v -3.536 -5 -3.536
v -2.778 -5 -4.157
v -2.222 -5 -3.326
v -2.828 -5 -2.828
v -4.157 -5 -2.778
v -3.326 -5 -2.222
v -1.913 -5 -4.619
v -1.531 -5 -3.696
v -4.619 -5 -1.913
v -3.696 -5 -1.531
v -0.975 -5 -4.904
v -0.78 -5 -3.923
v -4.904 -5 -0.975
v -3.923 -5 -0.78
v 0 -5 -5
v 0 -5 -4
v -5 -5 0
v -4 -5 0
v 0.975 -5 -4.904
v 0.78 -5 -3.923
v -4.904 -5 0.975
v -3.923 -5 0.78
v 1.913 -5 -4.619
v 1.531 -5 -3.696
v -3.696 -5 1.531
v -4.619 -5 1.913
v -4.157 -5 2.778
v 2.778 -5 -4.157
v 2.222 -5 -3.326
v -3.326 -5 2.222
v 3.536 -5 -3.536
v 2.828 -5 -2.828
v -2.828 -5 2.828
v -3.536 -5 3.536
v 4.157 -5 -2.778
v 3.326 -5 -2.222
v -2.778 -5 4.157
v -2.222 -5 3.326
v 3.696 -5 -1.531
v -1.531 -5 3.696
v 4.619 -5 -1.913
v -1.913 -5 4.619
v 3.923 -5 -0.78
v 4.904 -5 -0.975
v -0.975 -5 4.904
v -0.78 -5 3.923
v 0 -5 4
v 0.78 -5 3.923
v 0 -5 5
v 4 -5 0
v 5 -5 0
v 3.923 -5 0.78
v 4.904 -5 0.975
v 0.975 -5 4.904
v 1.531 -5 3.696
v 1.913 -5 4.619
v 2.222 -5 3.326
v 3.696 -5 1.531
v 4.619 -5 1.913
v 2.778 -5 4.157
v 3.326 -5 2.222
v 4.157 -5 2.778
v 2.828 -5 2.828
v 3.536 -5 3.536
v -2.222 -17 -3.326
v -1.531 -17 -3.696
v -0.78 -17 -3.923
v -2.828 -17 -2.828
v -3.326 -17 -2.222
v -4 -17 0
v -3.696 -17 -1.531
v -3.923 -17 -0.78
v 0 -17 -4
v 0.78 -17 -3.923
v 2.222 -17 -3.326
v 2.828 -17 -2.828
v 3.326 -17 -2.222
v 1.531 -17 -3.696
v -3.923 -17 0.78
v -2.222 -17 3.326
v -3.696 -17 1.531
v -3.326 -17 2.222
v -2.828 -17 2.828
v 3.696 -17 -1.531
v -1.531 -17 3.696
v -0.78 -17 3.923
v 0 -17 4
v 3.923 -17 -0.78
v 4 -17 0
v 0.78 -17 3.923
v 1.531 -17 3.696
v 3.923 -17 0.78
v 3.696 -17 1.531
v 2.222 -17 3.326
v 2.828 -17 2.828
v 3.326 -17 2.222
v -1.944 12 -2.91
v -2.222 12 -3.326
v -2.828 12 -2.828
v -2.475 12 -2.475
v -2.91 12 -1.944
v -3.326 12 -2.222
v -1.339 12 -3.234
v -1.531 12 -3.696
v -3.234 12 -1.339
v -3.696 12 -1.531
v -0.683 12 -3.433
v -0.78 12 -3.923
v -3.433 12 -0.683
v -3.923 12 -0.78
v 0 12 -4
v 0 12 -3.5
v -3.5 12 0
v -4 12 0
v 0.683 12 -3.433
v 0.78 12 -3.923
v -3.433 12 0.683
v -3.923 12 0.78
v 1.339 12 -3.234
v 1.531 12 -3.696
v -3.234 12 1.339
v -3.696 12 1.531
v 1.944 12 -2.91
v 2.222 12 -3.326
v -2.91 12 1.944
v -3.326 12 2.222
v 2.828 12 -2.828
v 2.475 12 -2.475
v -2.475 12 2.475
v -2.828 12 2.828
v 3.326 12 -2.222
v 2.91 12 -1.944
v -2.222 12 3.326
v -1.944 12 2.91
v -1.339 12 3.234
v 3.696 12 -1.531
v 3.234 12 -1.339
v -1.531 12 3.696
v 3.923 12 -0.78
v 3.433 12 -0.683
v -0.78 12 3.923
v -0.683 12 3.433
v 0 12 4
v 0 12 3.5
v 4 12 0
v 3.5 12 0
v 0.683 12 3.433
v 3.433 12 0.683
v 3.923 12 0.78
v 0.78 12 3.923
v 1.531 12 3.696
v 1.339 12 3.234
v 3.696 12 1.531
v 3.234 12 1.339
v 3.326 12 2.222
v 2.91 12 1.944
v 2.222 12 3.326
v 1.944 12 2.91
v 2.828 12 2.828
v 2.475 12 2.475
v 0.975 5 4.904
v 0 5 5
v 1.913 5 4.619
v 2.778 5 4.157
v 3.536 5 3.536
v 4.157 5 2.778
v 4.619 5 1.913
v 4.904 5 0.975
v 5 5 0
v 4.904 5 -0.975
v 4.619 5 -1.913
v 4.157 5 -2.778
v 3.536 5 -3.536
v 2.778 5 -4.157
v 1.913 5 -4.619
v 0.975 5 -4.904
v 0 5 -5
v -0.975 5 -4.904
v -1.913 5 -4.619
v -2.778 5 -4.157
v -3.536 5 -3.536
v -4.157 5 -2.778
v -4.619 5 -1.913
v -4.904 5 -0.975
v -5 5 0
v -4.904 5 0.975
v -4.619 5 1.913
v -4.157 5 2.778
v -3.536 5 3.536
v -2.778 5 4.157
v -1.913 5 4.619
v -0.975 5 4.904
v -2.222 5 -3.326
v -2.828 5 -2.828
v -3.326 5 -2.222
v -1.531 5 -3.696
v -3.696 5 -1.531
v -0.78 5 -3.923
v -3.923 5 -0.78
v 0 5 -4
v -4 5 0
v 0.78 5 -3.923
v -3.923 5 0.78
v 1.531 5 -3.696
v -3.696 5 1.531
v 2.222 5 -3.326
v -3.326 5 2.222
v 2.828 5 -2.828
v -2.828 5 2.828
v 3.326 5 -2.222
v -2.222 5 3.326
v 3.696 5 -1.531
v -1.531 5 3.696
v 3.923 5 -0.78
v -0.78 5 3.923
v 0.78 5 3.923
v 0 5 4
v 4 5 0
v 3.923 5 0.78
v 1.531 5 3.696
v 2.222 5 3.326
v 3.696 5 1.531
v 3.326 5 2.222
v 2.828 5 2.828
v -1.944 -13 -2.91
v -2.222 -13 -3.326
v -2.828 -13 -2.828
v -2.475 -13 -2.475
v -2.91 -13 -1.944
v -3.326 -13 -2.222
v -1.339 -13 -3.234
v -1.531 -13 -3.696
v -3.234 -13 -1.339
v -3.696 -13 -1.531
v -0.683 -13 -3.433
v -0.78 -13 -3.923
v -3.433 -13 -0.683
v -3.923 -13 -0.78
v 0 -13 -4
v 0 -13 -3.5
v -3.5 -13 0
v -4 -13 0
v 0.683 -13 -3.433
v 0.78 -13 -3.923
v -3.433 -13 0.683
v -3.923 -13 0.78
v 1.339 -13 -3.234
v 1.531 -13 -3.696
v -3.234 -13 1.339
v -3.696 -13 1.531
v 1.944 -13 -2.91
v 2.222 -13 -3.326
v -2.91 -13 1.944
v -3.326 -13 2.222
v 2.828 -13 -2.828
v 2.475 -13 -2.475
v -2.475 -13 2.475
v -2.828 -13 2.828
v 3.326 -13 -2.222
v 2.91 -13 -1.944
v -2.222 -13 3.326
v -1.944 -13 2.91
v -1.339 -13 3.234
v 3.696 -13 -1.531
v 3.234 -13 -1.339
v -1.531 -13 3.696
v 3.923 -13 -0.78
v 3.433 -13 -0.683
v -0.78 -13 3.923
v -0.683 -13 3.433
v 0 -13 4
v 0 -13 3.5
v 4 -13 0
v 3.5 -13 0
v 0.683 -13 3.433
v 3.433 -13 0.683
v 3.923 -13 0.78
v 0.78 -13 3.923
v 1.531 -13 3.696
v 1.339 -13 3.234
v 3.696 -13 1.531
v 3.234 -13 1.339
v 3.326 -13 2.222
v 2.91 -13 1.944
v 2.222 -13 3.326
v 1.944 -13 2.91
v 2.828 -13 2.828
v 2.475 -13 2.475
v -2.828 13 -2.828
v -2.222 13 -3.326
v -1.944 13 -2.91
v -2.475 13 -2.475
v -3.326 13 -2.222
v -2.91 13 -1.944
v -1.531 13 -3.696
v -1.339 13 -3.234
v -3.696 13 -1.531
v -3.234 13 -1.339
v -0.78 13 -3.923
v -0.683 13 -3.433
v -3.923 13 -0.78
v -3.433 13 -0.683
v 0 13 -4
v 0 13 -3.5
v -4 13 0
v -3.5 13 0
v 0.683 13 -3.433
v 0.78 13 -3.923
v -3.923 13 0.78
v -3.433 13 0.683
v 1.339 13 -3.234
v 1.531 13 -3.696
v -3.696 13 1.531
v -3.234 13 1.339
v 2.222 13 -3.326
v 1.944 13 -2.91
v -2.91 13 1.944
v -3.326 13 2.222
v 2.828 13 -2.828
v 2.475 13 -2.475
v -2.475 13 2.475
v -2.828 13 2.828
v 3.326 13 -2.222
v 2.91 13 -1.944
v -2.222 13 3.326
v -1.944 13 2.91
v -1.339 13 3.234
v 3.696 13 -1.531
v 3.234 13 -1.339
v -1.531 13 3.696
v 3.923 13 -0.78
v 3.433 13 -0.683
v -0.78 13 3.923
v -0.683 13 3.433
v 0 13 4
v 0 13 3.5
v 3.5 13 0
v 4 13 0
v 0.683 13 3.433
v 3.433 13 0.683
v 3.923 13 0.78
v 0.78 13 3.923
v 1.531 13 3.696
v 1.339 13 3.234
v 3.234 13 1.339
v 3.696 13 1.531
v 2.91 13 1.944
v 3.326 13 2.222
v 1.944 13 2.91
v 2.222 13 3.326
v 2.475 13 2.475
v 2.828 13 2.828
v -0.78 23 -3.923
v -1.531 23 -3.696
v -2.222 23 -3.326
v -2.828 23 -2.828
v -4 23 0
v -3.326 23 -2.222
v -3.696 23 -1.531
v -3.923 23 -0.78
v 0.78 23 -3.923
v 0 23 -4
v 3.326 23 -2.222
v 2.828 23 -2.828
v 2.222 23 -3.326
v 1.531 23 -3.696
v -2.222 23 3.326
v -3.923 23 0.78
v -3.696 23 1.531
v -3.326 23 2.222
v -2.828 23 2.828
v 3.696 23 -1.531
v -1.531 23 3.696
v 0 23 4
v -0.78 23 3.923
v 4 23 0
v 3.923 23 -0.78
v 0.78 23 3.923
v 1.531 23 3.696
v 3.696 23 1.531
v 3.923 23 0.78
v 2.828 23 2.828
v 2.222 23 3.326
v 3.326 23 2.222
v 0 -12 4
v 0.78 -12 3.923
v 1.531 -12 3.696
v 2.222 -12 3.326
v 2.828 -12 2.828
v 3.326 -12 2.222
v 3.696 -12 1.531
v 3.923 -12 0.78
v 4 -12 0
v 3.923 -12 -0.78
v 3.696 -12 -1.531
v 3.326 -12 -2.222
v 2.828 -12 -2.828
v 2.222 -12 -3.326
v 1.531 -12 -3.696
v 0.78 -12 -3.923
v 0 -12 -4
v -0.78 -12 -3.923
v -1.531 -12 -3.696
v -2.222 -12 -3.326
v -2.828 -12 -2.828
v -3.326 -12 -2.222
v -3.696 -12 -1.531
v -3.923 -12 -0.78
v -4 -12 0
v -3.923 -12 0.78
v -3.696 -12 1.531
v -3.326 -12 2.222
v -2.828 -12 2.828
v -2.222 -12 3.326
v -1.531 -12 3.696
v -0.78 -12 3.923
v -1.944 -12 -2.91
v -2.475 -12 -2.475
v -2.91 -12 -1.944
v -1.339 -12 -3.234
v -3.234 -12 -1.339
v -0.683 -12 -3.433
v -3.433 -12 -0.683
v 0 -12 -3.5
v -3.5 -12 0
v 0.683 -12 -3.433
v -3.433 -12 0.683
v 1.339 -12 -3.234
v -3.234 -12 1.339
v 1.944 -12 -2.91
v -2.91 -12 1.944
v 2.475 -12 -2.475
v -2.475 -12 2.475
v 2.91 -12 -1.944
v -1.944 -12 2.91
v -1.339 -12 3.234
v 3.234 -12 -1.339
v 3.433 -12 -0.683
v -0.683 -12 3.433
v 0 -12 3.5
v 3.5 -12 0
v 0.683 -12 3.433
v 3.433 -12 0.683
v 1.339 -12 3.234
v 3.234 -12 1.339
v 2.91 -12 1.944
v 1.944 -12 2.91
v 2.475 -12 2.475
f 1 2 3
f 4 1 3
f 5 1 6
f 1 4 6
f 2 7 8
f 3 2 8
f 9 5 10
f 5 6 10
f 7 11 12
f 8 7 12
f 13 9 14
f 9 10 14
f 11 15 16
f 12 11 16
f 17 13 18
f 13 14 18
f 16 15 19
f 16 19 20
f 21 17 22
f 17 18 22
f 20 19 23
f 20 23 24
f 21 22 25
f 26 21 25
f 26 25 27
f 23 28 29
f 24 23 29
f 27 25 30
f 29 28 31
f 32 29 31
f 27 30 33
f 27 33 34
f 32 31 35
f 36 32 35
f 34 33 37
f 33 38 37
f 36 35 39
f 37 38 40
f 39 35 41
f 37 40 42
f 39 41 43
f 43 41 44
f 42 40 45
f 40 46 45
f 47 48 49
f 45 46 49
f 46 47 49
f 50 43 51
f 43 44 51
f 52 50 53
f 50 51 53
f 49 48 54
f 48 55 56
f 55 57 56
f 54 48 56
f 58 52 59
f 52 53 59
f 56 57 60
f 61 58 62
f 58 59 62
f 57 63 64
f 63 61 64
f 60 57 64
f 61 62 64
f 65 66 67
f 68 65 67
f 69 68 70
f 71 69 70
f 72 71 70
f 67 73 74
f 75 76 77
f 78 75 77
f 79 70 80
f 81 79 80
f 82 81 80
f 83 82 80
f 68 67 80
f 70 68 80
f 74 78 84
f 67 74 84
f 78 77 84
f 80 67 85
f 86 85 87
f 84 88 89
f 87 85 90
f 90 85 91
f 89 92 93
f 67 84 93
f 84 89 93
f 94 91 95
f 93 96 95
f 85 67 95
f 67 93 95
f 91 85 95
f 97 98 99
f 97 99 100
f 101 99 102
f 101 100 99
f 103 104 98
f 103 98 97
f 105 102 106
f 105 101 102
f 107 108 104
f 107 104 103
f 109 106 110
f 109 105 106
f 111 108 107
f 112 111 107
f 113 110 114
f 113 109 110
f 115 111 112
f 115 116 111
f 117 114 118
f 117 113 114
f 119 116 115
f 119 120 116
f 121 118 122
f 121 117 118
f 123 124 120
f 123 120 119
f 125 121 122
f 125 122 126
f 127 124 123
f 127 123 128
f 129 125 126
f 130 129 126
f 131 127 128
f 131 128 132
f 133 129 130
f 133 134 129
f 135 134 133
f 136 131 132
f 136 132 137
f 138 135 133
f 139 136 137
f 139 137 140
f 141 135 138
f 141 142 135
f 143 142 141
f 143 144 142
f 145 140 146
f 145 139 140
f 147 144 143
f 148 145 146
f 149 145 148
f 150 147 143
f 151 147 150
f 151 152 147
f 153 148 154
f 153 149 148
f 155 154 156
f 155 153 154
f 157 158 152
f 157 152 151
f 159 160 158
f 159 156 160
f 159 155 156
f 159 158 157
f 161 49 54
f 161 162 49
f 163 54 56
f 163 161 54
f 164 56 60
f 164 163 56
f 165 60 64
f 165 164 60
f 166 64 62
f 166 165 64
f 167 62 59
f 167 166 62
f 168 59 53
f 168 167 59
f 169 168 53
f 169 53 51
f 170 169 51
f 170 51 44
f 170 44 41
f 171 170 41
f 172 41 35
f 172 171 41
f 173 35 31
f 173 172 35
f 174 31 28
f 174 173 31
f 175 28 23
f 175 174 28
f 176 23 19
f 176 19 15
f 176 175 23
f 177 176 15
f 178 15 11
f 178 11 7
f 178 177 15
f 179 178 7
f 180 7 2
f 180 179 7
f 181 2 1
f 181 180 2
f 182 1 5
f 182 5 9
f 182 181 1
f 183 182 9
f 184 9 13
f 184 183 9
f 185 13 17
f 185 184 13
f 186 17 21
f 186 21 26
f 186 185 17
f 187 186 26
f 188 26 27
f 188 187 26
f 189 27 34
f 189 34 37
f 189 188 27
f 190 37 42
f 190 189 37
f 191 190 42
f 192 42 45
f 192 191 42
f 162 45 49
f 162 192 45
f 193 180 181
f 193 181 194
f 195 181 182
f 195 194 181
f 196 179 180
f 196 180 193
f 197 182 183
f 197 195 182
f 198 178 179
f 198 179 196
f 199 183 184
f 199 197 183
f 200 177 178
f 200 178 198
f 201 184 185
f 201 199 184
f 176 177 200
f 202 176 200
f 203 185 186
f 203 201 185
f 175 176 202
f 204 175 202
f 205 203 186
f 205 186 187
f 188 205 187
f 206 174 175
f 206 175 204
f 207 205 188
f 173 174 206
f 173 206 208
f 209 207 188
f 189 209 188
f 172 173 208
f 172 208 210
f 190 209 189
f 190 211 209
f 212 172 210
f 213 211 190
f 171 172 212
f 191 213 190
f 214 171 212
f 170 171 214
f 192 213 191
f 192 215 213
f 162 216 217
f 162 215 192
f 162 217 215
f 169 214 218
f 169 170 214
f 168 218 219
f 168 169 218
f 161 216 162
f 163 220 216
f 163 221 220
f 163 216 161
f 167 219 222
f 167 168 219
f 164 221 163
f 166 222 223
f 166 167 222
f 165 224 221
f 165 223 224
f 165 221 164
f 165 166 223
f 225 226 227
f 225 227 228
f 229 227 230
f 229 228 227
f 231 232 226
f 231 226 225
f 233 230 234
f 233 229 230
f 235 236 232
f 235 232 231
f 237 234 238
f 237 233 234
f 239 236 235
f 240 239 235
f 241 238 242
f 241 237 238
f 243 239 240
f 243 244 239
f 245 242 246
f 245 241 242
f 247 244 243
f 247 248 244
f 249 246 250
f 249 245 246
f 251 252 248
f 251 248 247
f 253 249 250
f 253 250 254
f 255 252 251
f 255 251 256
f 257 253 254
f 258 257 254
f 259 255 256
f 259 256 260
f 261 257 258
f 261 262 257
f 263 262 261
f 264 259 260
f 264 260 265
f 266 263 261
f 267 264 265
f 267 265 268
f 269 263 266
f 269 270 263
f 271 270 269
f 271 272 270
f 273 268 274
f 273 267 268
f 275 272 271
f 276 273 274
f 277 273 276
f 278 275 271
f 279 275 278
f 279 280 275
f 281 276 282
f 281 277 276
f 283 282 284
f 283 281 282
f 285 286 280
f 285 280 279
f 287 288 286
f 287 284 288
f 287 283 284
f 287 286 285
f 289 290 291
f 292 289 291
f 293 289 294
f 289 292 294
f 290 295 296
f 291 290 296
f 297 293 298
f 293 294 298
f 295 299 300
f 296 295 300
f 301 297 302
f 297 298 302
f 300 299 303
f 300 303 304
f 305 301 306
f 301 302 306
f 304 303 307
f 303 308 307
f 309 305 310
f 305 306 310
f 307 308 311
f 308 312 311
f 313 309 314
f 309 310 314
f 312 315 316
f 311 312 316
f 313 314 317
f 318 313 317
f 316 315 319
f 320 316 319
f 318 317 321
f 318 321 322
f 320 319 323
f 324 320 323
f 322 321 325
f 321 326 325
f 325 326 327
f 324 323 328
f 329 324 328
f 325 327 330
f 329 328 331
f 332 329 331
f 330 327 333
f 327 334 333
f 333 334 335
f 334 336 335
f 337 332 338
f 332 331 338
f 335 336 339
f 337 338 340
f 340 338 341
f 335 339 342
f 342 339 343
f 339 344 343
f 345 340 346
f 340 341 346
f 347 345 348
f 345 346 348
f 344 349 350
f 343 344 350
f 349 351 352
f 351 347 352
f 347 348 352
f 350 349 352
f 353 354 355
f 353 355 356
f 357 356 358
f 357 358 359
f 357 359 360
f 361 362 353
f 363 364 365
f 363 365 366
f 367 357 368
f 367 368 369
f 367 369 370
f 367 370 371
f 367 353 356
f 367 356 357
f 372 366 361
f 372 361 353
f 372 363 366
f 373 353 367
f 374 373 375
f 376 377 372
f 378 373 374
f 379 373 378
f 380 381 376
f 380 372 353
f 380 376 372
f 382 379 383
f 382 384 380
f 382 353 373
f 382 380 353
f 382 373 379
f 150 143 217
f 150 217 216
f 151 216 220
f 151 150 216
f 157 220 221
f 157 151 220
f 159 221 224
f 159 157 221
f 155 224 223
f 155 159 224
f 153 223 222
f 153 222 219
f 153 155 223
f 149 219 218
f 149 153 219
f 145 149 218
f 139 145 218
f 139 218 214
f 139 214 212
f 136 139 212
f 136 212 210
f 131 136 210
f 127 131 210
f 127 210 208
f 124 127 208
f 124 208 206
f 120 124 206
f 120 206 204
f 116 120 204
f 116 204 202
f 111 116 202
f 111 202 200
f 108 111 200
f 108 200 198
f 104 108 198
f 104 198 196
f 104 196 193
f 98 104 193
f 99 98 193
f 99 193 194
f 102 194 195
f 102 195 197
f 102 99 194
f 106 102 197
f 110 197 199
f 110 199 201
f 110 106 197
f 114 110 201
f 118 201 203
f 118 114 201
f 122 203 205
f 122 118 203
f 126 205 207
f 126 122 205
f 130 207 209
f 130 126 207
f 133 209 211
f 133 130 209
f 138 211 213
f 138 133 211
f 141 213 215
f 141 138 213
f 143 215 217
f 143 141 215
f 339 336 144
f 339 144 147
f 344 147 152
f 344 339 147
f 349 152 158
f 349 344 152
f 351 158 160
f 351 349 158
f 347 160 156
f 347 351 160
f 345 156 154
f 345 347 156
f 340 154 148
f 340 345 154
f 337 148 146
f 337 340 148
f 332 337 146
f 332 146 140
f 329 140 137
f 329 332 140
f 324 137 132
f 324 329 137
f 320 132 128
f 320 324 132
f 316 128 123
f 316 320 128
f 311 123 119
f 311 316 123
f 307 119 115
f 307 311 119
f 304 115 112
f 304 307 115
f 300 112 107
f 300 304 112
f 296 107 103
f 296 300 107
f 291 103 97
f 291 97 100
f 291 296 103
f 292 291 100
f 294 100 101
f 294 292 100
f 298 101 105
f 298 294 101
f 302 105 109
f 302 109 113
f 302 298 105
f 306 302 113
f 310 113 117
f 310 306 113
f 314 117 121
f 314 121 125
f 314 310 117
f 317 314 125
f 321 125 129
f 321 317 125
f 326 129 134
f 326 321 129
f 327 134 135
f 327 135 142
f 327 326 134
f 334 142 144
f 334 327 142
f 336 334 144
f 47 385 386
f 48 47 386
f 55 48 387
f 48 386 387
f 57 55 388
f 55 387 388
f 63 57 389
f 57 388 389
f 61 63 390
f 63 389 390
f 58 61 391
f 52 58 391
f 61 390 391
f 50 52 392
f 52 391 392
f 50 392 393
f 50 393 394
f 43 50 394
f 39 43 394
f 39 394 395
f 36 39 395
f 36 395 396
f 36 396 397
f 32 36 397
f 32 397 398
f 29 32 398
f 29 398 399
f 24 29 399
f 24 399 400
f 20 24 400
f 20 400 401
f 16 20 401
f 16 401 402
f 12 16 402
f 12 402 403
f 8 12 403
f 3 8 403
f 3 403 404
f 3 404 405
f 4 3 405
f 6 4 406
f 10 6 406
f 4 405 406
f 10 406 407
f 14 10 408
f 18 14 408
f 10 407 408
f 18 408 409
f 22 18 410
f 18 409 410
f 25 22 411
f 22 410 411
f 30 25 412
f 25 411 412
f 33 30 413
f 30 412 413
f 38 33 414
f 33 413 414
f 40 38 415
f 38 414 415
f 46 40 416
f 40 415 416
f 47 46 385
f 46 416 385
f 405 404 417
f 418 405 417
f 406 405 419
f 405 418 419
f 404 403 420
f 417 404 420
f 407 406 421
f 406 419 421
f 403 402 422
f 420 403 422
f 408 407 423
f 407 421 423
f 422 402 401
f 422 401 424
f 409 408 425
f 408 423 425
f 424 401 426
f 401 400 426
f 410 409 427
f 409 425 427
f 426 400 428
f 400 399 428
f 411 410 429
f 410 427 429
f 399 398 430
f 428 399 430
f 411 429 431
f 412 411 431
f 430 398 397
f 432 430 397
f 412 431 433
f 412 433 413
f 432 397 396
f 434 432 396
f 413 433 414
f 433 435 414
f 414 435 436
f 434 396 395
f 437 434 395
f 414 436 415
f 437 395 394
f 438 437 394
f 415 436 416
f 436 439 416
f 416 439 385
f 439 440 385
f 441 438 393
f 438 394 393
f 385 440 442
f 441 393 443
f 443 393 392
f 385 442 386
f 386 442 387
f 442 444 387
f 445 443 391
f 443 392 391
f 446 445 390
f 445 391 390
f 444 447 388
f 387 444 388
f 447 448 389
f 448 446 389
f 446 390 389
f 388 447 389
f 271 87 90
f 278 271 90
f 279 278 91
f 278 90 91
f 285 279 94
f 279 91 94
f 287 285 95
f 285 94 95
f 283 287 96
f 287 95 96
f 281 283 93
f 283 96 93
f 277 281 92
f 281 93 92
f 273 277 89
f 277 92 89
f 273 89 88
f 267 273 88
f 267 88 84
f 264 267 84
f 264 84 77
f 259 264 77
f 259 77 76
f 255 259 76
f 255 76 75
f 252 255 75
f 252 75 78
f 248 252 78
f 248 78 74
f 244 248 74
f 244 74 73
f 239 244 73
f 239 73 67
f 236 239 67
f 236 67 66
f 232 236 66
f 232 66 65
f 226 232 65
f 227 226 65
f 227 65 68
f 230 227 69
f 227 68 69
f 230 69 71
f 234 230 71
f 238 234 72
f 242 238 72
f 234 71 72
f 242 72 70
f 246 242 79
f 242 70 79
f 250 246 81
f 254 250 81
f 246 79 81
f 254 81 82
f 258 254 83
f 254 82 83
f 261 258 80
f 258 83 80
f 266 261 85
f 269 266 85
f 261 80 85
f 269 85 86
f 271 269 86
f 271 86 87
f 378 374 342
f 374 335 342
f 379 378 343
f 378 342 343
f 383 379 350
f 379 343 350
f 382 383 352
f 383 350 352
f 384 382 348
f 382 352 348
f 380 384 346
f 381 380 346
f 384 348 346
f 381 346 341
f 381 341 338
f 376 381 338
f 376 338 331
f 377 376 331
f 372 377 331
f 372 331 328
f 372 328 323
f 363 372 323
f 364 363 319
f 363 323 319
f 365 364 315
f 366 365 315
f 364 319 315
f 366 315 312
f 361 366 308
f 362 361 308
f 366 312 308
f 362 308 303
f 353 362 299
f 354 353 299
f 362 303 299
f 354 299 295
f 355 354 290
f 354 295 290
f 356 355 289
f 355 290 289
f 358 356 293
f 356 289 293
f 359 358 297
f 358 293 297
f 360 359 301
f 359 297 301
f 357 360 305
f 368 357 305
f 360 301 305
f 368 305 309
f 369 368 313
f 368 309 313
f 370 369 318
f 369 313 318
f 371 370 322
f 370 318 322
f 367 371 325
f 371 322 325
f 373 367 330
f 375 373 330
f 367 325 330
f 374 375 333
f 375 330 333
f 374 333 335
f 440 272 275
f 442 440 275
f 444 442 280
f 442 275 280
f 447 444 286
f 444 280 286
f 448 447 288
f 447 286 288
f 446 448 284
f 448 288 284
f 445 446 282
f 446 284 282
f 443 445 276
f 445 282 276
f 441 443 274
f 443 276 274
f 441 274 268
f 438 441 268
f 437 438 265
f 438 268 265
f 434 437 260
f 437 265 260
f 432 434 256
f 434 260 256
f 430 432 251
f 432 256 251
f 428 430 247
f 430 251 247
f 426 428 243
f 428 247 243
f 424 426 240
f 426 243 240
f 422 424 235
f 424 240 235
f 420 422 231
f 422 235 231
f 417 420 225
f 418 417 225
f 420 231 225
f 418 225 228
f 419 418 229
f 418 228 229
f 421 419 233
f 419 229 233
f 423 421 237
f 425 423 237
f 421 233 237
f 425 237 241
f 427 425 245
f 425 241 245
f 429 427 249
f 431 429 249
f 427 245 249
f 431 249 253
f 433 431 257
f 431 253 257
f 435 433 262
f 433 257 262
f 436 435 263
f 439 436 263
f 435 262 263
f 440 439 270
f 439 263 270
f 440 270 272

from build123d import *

# Parameters (mm, degrees)
SKETCH1_R           = 5
BOSS_EXTRUDE1_DEPTH = 17
SKETCH2_R           = 5
SKETCH2_R_2         = 4
CUT_EXTRUDE1_DEPTH  = 12
CUT_EXTRUDE2_START  = -4
SKETCH3_R           = 4
SKETCH3_R_2         = 3.5
CUT_EXTRUDE2_DEPTH  = 1
SKETCH4_R           = 4
BOSS_EXTRUDE2_DEPTH = 6


with BuildPart() as part:
    # Sketch1 → Boss-Extrude1 (new, symmetric)
    with BuildSketch(Plane(origin=(0, 0, 0), x_dir=(1, 0, 0), z_dir=(0, 1, 0))):
        with Locations(Location((0, 0, 0), (0, 0, 270))):
            Circle(SKETCH1_R)
    extrude(amount=BOSS_EXTRUDE1_DEPTH, both=True)

    # Sketch2 → Cut-Extrude1 (cut)
    with BuildSketch(Plane(origin=(0, 17, 0), x_dir=(1, 0, 0), z_dir=(0, 1, 0))):
        with Locations(Location((0, 0, 0), (0, 0, 270))):
            Circle(SKETCH2_R)
        with Locations(Location((0, 0, 0), (0, 0, 270))):
            Circle(SKETCH2_R_2, mode=Mode.SUBTRACT)
    cut_extrude1 = extrude(amount=-CUT_EXTRUDE1_DEPTH, mode=Mode.SUBTRACT)

    # Mirror1: Cut-Extrude1 across plane
    add(cut_extrude1.mirror(Plane.ZX), mode=Mode.SUBTRACT)

    # Sketch3 → Cut-Extrude2 (cut)
    with BuildSketch(Plane(origin=(0, 17, 0), x_dir=(1, 0, 0), z_dir=(0, 1, 0)).offset(CUT_EXTRUDE2_START)):
        with Locations(Location((0, 0, 0), (0, 0, 270))):
            Circle(SKETCH3_R)
        with Locations(Location((0, 0, 0), (0, 0, 270))):
            Circle(SKETCH3_R_2, mode=Mode.SUBTRACT)
    cut_extrude2 = extrude(amount=-CUT_EXTRUDE2_DEPTH, mode=Mode.SUBTRACT)

    # Mirror2: Cut-Extrude2 across plane
    add(cut_extrude2.mirror(Plane.ZX), mode=Mode.SUBTRACT)

    # Sketch4 → Boss-Extrude2 (add)
    with BuildSketch(Plane(origin=(0, 17, 0), x_dir=(1, 0, 0), z_dir=(0, 1, 0))):
        with Locations(Location((0, 0, 0), (0, 0, 270))):
            Circle(SKETCH4_R)
    extrude(amount=BOSS_EXTRUDE2_DEPTH)


solid = part.part
